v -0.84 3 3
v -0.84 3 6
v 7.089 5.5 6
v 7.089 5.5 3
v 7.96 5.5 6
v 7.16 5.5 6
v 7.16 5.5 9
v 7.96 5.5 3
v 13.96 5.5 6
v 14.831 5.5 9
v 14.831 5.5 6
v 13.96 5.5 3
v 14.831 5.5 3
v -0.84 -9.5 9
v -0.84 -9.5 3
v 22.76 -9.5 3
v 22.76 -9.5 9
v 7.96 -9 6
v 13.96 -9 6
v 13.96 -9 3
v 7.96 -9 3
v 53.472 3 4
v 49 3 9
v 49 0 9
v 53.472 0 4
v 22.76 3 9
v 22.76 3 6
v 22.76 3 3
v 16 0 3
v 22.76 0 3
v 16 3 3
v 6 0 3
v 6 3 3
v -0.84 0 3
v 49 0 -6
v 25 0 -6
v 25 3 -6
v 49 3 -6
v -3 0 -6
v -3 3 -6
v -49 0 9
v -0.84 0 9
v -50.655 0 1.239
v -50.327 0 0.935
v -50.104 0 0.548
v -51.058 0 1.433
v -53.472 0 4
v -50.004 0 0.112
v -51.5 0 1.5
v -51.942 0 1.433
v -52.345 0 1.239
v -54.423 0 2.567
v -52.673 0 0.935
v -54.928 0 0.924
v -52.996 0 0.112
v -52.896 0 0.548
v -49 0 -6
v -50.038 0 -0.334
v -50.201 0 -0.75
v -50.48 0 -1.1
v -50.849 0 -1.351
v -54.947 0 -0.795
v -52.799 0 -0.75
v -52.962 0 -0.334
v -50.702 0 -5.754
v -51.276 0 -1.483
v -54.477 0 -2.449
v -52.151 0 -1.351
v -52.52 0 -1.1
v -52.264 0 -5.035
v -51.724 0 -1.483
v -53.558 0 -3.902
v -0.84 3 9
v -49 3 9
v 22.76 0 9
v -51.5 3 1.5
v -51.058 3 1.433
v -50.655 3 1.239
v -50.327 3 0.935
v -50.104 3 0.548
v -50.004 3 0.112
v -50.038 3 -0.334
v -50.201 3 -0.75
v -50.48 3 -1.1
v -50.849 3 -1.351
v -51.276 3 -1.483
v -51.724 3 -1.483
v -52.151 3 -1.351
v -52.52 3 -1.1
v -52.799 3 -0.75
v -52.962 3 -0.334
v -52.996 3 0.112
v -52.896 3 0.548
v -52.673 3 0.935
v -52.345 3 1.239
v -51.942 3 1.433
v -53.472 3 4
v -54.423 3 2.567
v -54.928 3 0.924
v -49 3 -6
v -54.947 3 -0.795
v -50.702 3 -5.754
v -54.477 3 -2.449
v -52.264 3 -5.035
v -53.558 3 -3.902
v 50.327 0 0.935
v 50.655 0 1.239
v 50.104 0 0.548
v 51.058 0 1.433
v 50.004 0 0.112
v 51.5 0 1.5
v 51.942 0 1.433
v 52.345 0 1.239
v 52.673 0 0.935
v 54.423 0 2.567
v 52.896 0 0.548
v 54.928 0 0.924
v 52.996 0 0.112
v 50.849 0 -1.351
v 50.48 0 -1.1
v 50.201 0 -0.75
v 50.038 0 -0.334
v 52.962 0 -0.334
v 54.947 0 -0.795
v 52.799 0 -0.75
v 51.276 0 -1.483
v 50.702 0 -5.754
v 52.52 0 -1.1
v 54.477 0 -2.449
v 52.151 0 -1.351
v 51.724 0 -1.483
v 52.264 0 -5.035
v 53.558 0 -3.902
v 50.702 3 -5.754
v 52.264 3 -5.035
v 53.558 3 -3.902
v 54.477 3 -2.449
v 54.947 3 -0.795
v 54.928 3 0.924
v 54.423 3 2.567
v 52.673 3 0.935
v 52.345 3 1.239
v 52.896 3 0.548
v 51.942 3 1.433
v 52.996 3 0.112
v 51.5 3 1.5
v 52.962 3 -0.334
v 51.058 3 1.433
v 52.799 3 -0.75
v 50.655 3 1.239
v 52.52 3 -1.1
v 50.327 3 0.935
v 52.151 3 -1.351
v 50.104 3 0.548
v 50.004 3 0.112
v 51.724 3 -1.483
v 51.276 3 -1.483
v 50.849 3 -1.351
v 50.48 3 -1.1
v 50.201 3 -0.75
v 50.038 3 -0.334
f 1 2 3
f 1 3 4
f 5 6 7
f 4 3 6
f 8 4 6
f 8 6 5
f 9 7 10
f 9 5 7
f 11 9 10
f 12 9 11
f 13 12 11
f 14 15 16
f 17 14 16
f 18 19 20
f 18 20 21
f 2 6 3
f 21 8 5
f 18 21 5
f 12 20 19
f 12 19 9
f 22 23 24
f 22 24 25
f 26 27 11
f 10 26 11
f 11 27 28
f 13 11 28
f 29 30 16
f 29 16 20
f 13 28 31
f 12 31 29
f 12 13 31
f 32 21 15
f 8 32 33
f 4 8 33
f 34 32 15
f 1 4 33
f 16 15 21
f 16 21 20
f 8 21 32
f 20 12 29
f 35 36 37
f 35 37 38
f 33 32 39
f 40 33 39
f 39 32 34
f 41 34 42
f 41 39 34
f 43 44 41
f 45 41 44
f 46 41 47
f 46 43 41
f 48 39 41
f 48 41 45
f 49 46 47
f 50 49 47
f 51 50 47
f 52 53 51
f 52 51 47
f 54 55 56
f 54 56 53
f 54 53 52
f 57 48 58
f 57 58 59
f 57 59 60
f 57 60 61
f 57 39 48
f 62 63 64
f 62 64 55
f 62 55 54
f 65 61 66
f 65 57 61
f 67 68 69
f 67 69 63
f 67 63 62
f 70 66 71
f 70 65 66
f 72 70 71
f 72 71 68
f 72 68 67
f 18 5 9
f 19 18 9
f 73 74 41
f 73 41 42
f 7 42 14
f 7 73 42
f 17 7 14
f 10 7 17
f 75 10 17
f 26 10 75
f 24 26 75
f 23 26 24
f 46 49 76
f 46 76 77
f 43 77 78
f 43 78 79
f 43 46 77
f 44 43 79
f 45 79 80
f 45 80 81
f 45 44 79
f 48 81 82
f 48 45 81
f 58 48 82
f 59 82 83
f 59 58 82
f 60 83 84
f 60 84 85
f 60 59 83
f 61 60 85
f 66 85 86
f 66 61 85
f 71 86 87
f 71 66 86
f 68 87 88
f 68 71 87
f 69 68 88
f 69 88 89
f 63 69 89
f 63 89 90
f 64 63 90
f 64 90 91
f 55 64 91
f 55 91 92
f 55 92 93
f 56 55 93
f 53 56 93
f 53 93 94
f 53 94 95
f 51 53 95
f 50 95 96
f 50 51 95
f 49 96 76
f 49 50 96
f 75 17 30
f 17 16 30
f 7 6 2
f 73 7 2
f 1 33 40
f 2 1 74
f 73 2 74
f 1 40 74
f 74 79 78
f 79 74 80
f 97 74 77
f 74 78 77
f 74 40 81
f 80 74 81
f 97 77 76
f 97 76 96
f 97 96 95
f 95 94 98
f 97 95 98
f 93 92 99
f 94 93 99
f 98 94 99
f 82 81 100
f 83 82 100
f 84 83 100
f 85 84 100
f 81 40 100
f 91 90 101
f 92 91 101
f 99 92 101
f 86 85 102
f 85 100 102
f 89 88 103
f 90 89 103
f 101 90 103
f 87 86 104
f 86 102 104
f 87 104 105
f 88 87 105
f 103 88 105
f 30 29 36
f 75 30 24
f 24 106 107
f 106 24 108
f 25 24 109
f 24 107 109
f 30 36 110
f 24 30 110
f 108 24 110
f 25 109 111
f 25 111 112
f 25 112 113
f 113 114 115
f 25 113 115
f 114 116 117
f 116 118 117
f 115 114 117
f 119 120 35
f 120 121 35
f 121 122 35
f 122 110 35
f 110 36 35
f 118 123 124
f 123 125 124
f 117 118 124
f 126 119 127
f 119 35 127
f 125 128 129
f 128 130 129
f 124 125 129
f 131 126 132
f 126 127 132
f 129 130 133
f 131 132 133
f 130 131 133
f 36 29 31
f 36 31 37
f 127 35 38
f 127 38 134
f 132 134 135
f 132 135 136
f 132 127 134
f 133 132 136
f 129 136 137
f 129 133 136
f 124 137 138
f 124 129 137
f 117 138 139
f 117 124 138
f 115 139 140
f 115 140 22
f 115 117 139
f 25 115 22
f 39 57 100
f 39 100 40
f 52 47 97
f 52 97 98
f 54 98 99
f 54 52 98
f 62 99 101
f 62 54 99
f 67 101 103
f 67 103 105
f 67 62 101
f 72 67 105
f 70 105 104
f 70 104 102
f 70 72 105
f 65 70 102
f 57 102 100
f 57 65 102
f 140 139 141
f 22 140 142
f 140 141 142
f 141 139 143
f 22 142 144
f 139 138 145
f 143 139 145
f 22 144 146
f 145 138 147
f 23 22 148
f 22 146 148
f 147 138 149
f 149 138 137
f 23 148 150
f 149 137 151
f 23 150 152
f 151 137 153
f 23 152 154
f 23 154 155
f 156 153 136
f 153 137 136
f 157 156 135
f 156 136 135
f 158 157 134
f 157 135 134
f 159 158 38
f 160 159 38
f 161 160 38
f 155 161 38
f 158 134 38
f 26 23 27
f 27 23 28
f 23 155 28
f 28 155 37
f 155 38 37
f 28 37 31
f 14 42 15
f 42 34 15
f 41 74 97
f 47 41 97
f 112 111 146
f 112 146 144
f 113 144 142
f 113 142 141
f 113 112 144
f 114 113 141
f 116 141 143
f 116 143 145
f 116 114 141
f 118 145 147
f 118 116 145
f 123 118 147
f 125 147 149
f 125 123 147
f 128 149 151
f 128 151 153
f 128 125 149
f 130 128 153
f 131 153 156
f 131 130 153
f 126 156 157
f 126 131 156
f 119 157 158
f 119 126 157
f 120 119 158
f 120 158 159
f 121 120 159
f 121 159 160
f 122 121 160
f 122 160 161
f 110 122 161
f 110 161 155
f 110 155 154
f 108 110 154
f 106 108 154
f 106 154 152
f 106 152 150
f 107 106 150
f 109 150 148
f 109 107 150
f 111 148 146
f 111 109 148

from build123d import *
from OCP.BRepFilletAPI import BRepFilletAPI_MakeChamfer

# Parameters (mm, degrees)
SKETCH1_R           = 1.5
BOSS_EXTRUDE1_DEPTH = 3
CUT_EXTRUDE1_DEPTH  = 10
CUT_EXTRUDE3_START  = -3
SKETCH8_W           = 6
SKETCH8_H           = 3
CUT_EXTRUDE3_DEPTH  = 4
BOSS_EXTRUDE4_START = 2.5
BOSS_EXTRUDE4_DEPTH = 15
BOSS_EXTRUDE5_DEPTH = 3
BOSS_EXTRUDE6_START = 2.5
SKETCH11_W          = 8
SKETCH11_H          = 3
BOSS_EXTRUDE6_DEPTH = 15
CHAMFER1_SIZE       = 7.928987006
CHAMFER1_SIZE_2     = 2.5
SKETCH12_W          = 6
SKETCH12_H          = 0.5
BOSS_EXTRUDE7_DEPTH = 3
BOSS_EXTRUDE8_START = 6
BOSS_EXTRUDE8_DEPTH = 3
BOSS_EXTRUDE9_DEPTH = 3


with BuildPart() as part:
    # Sketch1 → Boss-Extrude1 (new body)
    with BuildSketch(Plane(origin=(0, 0, 0), x_dir=(1, 0, 0), z_dir=(0, 1, 0))):
        with BuildLine():
            Line((-49, 6), (49, 6))
            ThreePointArc((49, 6), (55, 0), (49, -6))
            Line((49, -6), (-49, -6))
            ThreePointArc((-49, -6), (-55, 0), (-49, 6))
        make_face()
        with Locations(Location((-51.5, 0, 0), (0, 0, 270))):
            Circle(SKETCH1_R, mode=Mode.SUBTRACT)
        with Locations(Location((51.5, 0, 0), (0, 0, 270))):
            Circle(SKETCH1_R, mode=Mode.SUBTRACT)
    extrude(amount=BOSS_EXTRUDE1_DEPTH)

    # Sketch2 → Cut-Extrude1 (cut)
    with BuildSketch(Plane(origin=(0, 3, 0), x_dir=(1, 0, 0), z_dir=(0, 1, 0))):
        Polygon((-9, 6), (0, -3), (22, -3), (31, 6), align=None)
    extrude(amount=-CUT_EXTRUDE1_DEPTH, mode=Mode.SUBTRACT)

    # Sketch8 → Cut-Extrude3 (cut)
    with BuildSketch(Plane.XY.offset(6).offset(CUT_EXTRUDE3_START)):
        with Locations((10.960071178, 1.5)):
            Rectangle(SKETCH8_W, SKETCH8_H)
    extrude(amount=CUT_EXTRUDE3_DEPTH, mode=Mode.SUBTRACT)


with BuildPart() as cut_extrude3_piece_1:
    # of the separate pieces the step leaves, piece 1, a body of its own (cut_extrude3_pieces)
    add(part.part.solids().sort_by_distance((-49, 0, -6))[0])

    # Sketch9 → Boss-Extrude4 (add)
    with BuildSketch(Plane(origin=(0, 3, 0), x_dir=(1, 0, 0), z_dir=(0, 1, 0)).offset(BOSS_EXTRUDE4_START)):
        Polygon((13.960071178, -6), (13.960071178, -3), (14.760071178, -3), (14.760071178, -6.8), (7.160071178, -6.8), (7.160071178, -3), (7.960071178, -3), (7.960071178, -6), align=None)
    extrude(amount=-BOSS_EXTRUDE4_DEPTH)



with BuildPart() as cut_extrude3_piece_2:
    # of the separate pieces the step leaves, piece 2, a body of its own (cut_extrude3_pieces)
    add(part.part.solids().sort_by_distance((49, 0, 6))[0])


with BuildPart() as cut_extrude3_piece_1_1:
    add(cut_extrude3_piece_1.part)

    add(cut_extrude3_piece_2.part)  # Boss-Extrude5 merges Cut-Extrude3 piece 2
    # Sketch10 → Boss-Extrude5 (add)
    with BuildSketch(Plane(origin=(0, 0, 0), x_dir=(1, 0, 0), z_dir=(0, 1, 0))):
        Polygon((22, -3), (16, -3), (25, 6), (31, 6), align=None)
        Polygon((0, -3), (6, -3), (-3, 6), (-9, 6), align=None)
    extrude(amount=BOSS_EXTRUDE5_DEPTH)

    # Sketch11 → Boss-Extrude6 (add)
    with BuildSketch(Plane(origin=(0, 3, 0), x_dir=(1, 0, 0), z_dir=(0, 1, 0)).offset(BOSS_EXTRUDE6_START)):
        with Locations((3.160071178, -4.5)):
            Rectangle(SKETCH11_W, SKETCH11_H)
        Polygon((16, -3), (14.760071178, -3), (14.760071178, -6), (22.760071178, -6), (22.760071178, -3), align=None)
    extrude(amount=-BOSS_EXTRUDE6_DEPTH)

    # Chamfer1
    chamfer1_edges_1 = [cut_extrude3_piece_1_1.edges().sort_by_distance(p)[0] for p in [
        (-0.839928822, 5.5, 4.5),
    ]]
    chamfer1_side_1 = [cut_extrude3_piece_1_1.faces().sort_by_distance(p)[0] for p in [
        (-0.789928822, 5.5, 4.5),
    ]]
    chamfer1_edges_2 = [cut_extrude3_piece_1_1.edges().sort_by_distance(p)[0] for p in [
        (22.760071178, 5.5, 4.5),
    ]]
    chamfer1_side_2 = [cut_extrude3_piece_1_1.faces().sort_by_distance(p)[0] for p in [
        (22.760071178, 5.45, 4.5),
    ]]
    chamfer1 = BRepFilletAPI_MakeChamfer(cut_extrude3_piece_1_1.part.solid().wrapped)
    for e in chamfer1_edges_1:
        chamfer1.Add(CHAMFER1_SIZE - 0.0001, CHAMFER1_SIZE_2 - 0.0001, e.wrapped, chamfer1_side_1[0].wrapped)
    for e in chamfer1_edges_2:
        chamfer1.Add(CHAMFER1_SIZE_2 - 0.0001, CHAMFER1_SIZE - 0.0001, e.wrapped, chamfer1_side_2[0].wrapped)
    add(Compound.cast(chamfer1.Shape()), mode=Mode.REPLACE)  # a hair under: the kernel refuses the full size

    # Sketch12 → Boss-Extrude7 (add)
    with BuildSketch(Plane(origin=(0, 0, 6), x_dir=(-1, 0, 0), z_dir=(0, 0, -1))):
        with Locations((-10.960071178, -9.25)):
            Rectangle(SKETCH12_W, SKETCH12_H)
    extrude(amount=BOSS_EXTRUDE7_DEPTH)

    # Sketch13 → Boss-Extrude8 (add)
    with BuildSketch(Plane.XY.offset(BOSS_EXTRUDE8_START)):
        Polygon((7.160071178, 5.5), (-0.839928822, 3), (-49, 3), (-49, 0), (-0.839928822, 0), (-0.839928822, -9.5), (7.160071178, -9.5), (14.760071178, -9.5), (22.760071178, -9.5), (22.760071178, 0), (49, 0), (49, 3), (22.760071178, 3), (14.831084172, 5.5), (14.760071178, 5.5), align=None)
    extrude(amount=BOSS_EXTRUDE8_DEPTH)

    # Sketch14 → Boss-Extrude9 (add)
    with BuildSketch(Plane(origin=(0, 3, 0), x_dir=(1, 0, 0), z_dir=(0, 1, 0))):
        with BuildLine():
            Line((-49, -9), (-53.472135955, -4))
            ThreePointArc((-53.472135955, -4), (-51.449489743, -5.477225575), (-49, -6))
            Line((-49, -6), (-49, -9))
        make_face()
        with BuildLine():
            Line((49, -9), (53.472135955, -4))
            ThreePointArc((53.472135955, -4), (51.449489743, -5.477225575), (49, -6))
            Line((49, -6), (49, -9))
        make_face()
    extrude(amount=-BOSS_EXTRUDE9_DEPTH)


solid = cut_extrude3_piece_1_1.part
